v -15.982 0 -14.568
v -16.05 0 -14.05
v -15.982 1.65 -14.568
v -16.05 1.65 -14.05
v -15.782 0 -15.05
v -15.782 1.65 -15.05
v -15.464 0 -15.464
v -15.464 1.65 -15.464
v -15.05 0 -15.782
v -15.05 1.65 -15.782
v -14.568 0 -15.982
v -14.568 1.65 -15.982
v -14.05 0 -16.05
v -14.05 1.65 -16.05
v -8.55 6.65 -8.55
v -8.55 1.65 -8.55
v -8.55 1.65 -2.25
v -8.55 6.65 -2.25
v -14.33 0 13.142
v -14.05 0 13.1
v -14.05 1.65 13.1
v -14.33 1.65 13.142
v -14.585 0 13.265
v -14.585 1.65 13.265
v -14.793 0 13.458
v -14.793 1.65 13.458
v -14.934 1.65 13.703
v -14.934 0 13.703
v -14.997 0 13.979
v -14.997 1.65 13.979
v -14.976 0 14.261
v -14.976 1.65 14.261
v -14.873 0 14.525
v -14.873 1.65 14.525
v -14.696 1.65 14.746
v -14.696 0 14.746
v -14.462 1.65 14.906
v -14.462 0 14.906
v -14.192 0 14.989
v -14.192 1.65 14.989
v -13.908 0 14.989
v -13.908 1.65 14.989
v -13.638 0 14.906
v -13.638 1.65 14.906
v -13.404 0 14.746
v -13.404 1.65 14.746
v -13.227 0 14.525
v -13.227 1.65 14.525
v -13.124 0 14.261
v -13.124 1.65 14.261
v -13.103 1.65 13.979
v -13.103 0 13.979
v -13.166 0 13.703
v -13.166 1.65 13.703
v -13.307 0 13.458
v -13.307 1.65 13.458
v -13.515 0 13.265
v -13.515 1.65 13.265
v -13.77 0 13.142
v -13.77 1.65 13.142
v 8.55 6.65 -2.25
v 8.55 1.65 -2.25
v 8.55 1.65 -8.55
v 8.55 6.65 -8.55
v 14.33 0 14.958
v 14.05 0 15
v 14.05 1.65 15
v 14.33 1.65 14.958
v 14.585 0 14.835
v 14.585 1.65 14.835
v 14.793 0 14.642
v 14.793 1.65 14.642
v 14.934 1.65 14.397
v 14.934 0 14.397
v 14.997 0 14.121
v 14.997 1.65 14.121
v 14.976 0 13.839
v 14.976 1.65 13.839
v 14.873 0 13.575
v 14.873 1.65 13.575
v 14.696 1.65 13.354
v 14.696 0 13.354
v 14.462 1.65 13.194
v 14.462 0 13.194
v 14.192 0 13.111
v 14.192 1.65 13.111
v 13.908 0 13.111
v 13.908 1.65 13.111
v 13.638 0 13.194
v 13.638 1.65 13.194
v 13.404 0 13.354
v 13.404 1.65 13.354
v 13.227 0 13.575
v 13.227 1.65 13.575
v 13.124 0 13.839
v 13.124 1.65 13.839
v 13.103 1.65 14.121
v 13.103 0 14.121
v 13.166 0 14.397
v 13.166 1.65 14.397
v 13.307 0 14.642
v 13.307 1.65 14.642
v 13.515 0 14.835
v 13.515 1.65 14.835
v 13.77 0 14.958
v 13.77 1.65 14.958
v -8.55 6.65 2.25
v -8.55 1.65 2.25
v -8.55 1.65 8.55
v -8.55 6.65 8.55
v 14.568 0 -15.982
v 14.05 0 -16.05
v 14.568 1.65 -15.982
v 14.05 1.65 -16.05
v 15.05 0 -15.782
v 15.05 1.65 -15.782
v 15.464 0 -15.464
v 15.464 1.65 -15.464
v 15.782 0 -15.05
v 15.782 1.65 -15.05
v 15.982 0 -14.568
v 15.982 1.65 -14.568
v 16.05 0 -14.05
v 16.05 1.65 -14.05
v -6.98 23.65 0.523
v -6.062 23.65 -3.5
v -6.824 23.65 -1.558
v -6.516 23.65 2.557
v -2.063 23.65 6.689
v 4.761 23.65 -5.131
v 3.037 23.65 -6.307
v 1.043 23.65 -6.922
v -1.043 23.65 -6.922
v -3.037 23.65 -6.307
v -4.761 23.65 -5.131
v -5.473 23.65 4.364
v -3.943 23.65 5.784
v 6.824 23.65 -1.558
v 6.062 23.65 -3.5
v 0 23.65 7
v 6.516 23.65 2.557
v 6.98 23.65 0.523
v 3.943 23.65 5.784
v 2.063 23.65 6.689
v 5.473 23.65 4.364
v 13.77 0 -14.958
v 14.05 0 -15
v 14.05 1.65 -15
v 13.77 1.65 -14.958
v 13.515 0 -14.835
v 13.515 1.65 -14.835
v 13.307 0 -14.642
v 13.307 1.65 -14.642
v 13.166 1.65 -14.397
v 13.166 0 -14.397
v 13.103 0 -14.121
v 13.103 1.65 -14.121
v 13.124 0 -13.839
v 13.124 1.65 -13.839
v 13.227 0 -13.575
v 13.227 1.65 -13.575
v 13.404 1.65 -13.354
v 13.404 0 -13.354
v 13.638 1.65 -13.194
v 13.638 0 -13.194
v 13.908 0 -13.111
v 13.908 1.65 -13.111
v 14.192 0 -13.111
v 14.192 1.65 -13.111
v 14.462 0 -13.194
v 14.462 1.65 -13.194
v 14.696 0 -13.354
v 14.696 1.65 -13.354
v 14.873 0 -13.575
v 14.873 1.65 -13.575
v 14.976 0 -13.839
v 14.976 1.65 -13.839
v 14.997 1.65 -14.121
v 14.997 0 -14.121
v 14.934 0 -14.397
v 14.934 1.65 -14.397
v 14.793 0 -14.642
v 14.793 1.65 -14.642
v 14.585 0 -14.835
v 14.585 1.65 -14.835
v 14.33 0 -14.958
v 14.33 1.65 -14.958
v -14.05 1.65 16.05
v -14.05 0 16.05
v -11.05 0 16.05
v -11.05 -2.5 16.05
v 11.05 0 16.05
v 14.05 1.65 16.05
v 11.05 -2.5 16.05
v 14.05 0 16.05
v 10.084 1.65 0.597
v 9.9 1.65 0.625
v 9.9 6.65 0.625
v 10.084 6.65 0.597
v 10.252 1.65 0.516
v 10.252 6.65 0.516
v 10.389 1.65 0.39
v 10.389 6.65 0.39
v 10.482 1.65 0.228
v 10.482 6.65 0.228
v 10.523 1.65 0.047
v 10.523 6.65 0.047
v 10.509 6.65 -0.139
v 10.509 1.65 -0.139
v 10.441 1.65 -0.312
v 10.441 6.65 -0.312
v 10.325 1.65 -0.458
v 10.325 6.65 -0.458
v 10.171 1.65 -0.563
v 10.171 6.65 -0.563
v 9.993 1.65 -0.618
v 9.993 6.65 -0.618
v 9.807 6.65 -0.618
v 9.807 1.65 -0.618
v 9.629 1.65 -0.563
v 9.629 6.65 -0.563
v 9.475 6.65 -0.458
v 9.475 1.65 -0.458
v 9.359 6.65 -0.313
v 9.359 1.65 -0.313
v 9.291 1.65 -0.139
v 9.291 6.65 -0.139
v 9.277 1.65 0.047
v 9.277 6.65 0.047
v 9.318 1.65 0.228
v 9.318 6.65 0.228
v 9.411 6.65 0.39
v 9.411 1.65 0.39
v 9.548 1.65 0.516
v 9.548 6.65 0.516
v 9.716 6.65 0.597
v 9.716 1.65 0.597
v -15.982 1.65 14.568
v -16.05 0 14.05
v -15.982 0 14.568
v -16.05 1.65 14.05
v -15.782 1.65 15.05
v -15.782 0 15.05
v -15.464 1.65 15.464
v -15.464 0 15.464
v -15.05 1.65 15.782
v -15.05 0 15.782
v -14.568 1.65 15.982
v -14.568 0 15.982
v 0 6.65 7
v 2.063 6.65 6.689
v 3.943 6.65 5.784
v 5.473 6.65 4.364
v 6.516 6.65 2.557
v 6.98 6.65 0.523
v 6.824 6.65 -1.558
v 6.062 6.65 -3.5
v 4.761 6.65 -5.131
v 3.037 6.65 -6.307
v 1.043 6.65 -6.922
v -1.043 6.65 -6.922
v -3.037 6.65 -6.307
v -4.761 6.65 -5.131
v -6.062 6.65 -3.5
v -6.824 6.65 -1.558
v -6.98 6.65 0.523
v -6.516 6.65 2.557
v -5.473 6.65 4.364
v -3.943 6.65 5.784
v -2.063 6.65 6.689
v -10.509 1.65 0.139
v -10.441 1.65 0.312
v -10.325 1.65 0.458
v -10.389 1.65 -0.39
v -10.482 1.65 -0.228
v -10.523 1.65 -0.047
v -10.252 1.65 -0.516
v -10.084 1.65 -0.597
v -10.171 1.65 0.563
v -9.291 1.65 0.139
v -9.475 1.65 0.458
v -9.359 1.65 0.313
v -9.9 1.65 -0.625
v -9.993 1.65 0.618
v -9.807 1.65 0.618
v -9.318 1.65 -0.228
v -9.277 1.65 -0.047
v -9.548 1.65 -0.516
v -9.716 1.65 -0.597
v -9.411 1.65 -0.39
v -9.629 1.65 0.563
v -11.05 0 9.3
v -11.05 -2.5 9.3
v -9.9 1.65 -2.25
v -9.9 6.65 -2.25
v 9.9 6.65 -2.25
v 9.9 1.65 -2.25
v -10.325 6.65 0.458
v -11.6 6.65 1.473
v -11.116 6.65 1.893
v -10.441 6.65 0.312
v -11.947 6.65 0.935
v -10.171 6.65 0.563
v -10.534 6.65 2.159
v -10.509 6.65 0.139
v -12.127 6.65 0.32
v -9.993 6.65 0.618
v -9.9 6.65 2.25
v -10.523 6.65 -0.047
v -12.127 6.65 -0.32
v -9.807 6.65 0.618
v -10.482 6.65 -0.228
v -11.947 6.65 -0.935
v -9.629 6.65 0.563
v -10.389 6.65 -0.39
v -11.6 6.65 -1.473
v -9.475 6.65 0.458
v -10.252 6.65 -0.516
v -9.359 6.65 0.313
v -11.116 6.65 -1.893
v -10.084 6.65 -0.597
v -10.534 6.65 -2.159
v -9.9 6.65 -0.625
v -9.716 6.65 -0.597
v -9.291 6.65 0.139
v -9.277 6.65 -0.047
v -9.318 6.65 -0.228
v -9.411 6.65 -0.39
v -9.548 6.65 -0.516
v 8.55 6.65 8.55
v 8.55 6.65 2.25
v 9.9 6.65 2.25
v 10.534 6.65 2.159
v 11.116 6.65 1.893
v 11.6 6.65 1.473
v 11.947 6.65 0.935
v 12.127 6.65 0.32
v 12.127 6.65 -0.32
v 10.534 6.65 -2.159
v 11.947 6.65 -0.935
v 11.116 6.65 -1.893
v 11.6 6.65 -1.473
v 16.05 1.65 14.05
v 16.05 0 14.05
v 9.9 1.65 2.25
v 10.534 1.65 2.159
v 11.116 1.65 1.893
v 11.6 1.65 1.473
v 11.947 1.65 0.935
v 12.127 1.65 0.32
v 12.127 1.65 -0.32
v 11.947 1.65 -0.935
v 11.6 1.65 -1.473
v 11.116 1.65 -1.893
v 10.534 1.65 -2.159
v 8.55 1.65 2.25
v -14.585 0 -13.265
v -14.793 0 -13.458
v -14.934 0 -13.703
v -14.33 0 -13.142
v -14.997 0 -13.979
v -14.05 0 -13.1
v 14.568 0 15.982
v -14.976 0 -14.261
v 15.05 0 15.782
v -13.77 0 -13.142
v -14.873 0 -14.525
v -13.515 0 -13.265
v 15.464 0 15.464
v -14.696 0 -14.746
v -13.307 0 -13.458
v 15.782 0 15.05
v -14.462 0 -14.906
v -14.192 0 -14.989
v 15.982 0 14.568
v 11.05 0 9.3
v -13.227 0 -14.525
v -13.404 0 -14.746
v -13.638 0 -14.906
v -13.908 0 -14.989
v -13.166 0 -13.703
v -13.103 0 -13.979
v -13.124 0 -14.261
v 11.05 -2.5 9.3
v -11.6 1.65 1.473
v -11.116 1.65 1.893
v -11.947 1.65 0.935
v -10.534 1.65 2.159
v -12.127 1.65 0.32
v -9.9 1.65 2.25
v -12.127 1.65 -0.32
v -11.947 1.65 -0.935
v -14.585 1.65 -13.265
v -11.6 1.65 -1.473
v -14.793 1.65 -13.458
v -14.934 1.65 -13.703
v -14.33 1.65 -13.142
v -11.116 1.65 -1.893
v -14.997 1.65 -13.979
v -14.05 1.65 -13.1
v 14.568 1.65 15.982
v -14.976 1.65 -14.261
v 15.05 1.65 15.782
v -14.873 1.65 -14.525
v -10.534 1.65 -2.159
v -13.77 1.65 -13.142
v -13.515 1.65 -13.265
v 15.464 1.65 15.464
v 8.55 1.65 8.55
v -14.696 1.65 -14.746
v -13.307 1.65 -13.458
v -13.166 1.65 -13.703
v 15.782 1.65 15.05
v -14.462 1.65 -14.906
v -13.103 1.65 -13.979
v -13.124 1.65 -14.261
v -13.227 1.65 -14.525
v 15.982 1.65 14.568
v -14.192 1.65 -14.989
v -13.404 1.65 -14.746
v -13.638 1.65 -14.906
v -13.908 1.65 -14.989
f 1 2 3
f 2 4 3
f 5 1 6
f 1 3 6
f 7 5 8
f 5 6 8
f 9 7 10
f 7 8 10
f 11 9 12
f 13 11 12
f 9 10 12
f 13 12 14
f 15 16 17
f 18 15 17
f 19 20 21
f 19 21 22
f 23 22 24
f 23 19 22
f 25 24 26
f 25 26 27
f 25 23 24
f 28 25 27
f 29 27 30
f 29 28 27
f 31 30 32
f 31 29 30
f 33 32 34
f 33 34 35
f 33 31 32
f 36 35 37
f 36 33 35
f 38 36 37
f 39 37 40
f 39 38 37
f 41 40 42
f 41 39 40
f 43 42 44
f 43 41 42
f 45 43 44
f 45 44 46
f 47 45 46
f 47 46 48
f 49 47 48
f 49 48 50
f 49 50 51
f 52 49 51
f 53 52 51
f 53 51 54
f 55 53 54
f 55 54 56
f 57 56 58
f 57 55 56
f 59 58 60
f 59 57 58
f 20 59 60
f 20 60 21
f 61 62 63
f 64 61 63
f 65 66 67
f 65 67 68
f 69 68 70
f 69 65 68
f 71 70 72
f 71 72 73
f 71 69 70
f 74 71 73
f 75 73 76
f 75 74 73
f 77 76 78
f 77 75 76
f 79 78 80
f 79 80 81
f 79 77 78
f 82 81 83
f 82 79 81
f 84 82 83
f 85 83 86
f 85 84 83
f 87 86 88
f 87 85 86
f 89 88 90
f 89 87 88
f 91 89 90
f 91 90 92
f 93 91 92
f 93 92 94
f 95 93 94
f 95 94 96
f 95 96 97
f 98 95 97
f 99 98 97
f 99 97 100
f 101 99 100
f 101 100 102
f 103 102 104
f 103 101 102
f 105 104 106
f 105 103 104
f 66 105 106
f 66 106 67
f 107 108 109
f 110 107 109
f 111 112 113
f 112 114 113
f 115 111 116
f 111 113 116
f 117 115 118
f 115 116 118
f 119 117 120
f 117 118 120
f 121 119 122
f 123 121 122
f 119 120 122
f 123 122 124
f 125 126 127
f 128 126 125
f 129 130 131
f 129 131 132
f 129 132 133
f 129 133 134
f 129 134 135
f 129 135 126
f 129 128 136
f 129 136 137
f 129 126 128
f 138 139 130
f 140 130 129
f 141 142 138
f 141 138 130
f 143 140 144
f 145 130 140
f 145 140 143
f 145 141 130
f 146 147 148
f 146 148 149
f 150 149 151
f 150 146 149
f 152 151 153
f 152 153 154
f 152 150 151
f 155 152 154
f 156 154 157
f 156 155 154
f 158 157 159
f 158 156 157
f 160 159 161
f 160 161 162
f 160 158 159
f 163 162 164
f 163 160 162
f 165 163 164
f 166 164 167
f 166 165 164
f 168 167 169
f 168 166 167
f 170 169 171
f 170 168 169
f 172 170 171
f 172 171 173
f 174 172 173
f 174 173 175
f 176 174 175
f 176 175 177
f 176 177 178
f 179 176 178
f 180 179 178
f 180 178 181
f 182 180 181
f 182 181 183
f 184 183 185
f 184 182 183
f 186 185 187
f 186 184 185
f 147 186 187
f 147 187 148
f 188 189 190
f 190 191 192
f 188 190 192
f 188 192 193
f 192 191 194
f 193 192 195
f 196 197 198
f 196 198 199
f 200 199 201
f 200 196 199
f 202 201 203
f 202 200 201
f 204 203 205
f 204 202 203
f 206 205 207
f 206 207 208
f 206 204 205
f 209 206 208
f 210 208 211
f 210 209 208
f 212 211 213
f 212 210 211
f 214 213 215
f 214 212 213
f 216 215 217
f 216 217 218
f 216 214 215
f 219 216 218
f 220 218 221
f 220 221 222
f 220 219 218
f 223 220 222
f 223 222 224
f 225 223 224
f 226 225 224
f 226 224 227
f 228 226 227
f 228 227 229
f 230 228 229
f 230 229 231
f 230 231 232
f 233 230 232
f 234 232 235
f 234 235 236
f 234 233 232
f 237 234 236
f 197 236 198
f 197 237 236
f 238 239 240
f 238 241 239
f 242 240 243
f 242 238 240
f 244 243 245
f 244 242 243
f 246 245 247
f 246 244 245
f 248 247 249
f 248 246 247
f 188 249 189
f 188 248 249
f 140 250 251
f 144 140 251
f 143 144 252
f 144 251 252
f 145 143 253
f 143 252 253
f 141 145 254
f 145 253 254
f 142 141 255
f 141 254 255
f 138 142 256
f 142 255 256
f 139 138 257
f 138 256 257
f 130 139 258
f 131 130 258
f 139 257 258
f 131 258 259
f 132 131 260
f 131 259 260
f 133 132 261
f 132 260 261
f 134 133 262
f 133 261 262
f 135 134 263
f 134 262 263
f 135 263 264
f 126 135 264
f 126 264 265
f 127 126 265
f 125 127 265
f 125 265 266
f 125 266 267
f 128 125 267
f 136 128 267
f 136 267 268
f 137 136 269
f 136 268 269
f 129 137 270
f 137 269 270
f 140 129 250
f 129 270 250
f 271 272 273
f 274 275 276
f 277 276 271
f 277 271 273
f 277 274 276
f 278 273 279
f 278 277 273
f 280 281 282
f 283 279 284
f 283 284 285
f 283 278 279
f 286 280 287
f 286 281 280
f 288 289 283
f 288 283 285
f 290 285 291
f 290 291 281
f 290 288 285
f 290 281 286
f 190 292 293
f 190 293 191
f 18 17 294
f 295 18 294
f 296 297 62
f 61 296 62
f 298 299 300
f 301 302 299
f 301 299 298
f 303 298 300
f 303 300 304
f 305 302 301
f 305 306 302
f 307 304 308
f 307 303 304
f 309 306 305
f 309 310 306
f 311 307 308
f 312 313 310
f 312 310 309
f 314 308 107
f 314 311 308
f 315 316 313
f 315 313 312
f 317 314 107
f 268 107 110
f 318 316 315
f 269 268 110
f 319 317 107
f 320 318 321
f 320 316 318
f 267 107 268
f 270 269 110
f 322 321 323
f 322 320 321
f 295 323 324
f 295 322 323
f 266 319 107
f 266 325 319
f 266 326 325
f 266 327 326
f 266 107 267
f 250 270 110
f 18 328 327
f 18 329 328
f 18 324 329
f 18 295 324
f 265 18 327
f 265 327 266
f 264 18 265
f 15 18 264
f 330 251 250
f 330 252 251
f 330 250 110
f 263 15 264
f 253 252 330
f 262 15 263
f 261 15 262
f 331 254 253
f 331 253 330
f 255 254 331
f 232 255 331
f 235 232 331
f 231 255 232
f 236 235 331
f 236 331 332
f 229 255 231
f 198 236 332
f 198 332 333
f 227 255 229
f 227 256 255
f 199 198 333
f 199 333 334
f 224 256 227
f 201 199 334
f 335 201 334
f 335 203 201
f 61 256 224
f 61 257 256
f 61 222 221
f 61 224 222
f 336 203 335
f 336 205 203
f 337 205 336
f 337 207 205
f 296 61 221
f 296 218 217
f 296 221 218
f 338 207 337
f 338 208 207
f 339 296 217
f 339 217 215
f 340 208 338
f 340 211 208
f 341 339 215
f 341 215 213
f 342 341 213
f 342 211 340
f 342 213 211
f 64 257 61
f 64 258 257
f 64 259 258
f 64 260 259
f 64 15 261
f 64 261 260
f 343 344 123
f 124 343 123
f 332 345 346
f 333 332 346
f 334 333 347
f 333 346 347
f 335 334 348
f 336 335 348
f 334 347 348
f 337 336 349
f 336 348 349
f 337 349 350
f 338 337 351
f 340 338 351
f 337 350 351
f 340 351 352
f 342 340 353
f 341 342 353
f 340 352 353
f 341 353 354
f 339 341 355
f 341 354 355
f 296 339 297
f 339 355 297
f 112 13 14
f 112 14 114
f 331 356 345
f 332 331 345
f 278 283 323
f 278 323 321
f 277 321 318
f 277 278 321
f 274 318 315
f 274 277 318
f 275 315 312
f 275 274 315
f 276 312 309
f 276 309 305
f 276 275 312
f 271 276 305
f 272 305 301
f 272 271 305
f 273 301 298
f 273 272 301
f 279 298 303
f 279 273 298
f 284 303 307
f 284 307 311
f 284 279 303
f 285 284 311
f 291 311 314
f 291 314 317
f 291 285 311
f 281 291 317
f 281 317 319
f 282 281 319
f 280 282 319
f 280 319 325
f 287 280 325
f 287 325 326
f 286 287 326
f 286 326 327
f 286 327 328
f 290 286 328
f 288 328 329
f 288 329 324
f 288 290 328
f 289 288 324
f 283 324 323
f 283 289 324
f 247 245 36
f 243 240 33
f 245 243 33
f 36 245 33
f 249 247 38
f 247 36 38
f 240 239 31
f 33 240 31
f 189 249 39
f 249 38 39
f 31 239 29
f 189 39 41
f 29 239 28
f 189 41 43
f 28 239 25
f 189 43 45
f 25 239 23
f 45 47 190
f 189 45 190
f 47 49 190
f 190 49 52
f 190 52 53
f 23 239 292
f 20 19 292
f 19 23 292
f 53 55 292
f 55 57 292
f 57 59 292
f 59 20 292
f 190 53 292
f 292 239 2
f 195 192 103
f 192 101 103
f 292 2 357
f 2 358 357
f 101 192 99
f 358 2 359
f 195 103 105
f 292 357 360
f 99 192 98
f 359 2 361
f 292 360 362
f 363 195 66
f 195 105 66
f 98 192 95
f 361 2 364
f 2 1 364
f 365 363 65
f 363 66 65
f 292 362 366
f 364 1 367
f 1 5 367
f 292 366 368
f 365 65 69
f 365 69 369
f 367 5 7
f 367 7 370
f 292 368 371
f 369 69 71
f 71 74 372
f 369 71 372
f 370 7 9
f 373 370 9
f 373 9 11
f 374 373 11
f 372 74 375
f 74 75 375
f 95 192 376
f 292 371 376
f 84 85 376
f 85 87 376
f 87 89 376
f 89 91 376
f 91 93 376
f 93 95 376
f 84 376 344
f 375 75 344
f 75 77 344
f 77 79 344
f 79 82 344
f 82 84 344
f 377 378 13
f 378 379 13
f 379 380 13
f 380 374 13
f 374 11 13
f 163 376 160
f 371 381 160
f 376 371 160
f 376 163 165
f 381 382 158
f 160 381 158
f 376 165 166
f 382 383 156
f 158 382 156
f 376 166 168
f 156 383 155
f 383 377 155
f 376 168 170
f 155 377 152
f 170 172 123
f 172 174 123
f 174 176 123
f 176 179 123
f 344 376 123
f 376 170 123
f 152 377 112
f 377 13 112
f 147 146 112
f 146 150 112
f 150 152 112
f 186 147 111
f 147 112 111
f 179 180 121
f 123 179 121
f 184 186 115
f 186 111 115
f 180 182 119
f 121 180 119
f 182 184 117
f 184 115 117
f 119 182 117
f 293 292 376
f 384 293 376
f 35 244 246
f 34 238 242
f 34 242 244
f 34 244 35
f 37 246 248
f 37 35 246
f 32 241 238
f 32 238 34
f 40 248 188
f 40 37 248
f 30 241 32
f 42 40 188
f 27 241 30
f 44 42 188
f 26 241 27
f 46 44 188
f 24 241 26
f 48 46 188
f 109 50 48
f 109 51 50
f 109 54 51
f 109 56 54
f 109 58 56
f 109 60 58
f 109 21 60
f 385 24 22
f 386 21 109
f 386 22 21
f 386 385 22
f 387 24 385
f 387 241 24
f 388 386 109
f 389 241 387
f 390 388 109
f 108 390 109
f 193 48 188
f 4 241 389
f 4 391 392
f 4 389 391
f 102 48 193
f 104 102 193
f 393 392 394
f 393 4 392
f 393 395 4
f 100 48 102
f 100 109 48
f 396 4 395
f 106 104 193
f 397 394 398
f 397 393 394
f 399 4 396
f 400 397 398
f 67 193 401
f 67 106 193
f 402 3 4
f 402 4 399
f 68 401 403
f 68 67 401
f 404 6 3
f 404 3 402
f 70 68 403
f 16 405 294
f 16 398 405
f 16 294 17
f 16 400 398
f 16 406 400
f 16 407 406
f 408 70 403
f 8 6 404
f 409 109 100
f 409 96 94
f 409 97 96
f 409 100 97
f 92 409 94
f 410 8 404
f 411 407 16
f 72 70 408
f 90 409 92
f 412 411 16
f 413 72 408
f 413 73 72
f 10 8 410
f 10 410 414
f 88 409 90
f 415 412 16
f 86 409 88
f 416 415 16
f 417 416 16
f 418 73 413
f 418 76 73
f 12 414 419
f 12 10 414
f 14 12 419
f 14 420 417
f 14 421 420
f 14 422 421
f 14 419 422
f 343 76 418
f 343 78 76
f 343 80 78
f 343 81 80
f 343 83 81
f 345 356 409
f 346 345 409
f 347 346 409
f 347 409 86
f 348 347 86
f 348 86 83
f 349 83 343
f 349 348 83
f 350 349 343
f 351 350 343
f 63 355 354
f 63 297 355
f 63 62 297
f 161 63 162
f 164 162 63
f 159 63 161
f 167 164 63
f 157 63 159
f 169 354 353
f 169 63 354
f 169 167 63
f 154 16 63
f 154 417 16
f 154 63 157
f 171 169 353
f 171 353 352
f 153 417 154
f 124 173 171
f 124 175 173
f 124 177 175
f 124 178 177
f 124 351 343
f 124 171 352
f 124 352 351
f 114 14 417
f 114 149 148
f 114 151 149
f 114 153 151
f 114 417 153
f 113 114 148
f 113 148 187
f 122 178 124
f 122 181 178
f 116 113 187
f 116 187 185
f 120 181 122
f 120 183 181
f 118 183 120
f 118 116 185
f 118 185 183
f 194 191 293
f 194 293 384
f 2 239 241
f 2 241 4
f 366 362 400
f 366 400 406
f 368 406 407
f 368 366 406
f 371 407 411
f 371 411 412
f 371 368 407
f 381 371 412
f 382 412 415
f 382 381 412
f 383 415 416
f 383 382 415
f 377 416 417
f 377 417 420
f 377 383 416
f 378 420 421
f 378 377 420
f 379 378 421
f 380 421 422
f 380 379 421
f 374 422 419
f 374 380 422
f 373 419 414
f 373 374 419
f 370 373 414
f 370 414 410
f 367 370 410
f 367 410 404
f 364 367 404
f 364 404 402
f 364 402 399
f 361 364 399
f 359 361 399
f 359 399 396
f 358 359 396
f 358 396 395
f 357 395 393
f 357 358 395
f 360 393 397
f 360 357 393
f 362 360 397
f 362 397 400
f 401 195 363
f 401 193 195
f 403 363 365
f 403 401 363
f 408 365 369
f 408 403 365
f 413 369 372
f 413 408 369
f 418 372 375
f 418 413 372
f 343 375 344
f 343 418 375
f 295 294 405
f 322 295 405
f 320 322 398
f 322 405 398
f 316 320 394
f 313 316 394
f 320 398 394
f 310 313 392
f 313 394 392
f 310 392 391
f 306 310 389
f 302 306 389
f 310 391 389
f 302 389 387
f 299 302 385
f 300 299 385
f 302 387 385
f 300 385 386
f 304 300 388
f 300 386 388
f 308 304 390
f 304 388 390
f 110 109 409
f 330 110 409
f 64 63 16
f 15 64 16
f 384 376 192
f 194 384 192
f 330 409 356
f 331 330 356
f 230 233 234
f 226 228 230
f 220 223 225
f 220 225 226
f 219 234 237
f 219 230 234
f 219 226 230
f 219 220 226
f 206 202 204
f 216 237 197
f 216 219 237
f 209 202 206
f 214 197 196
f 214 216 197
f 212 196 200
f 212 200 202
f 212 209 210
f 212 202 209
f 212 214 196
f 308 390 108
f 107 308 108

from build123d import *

# Parameters (mm, degrees)
SKETCH1_W           = 32.1
SKETCH1_H           = 32.1
SKETCH1_R           = 0.95
BOSS_EXTRUDE1_DEPTH = 1.65
SKETCH2_W           = 22.1
SKETCH2_H           = 6.75
BOSS_EXTRUDE2_DEPTH = 2.5
SKETCH3_R           = 0.625
BOSS_EXTRUDE3_DEPTH = 5
SKETCH4_R           = 7
BOSS_EXTRUDE4_DEPTH = 17
FILLET1_R           = 2


with BuildPart() as part:
    # Sketch1 → Boss-Extrude1 (new body)
    with BuildSketch(Plane(origin=(0, 0, 0), x_dir=(1, 0, 0), z_dir=(0, 1, 0))):
        Rectangle(SKETCH1_W, SKETCH1_H)
        with Locations(Location((-14.05, 14.05, 0), (0, 0, 270))):
            Circle(SKETCH1_R, mode=Mode.SUBTRACT)
        with Locations(Location((14.05, 14.05, 0), (0, 0, 90))):
            Circle(SKETCH1_R, mode=Mode.SUBTRACT)
        with Locations(Location((14.05, -14.05, 0), (0, 0, 270))):
            Circle(SKETCH1_R, mode=Mode.SUBTRACT)
        with Locations(Location((-14.05, -14.05, 0), (0, 0, 90))):
            Circle(SKETCH1_R, mode=Mode.SUBTRACT)
    extrude(amount=BOSS_EXTRUDE1_DEPTH)

    # Sketch2 → Boss-Extrude2 (add)
    with BuildSketch(Plane.XZ):
        with Locations((0, 12.675)):
            Rectangle(SKETCH2_W, SKETCH2_H)
    extrude(amount=BOSS_EXTRUDE2_DEPTH)

    # Sketch3 → Boss-Extrude3 (add)
    with BuildSketch(Plane(origin=(0, 1.65, 0), x_dir=(1, 0, 0), z_dir=(0, 1, 0))):
        with BuildLine():
            Line((9.9, 2.25), (8.55, 2.25))
            Line((8.55, 2.25), (8.55, 8.55))
            Line((8.55, 8.55), (-8.55, 8.55))
            Line((-8.55, 8.55), (-8.55, 2.25))
            Line((-8.55, 2.25), (-9.9, 2.25))
            ThreePointArc((-9.9, 2.25), (-12.15, 0), (-9.9, -2.25))
            Line((-9.9, -2.25), (-8.55, -2.25))
            Line((-8.55, -2.25), (-8.55, -8.55))
            Line((-8.55, -8.55), (8.55, -8.55))
            Line((8.55, -8.55), (8.55, -2.25))
            Line((8.55, -2.25), (9.9, -2.25))
            ThreePointArc((9.9, -2.25), (12.15, 0), (9.9, 2.25))
        make_face()
        with Locations(Location((9.9, 0, 0), (0, 0, 270))):
            Circle(SKETCH3_R, mode=Mode.SUBTRACT)
        with Locations(Location((-9.9, 0, 0), (0, 0, 90))):
            Circle(SKETCH3_R, mode=Mode.SUBTRACT)
    extrude(amount=BOSS_EXTRUDE3_DEPTH)

    # Sketch4 → Boss-Extrude4 (add)
    with BuildSketch(Plane(origin=(0, 6.65, 0), x_dir=(1, 0, 0), z_dir=(0, 1, 0))):
        with Locations(Location((0, 0, 0), (0, 0, 270))):
            Circle(SKETCH4_R)
    extrude(amount=BOSS_EXTRUDE4_DEPTH)

    # Fillet1
    fillet1_edges = [part.edges().sort_by_distance(p)[0] for p in [
        (-16.05, 0.825, -16.05),
        (16.05, 0.825, -16.05),
        (16.05, 0.825, 16.05),
        (-16.05, 0.825, 16.05),
    ]]
    fillet(fillet1_edges, radius=FILLET1_R)


solid = part.part
